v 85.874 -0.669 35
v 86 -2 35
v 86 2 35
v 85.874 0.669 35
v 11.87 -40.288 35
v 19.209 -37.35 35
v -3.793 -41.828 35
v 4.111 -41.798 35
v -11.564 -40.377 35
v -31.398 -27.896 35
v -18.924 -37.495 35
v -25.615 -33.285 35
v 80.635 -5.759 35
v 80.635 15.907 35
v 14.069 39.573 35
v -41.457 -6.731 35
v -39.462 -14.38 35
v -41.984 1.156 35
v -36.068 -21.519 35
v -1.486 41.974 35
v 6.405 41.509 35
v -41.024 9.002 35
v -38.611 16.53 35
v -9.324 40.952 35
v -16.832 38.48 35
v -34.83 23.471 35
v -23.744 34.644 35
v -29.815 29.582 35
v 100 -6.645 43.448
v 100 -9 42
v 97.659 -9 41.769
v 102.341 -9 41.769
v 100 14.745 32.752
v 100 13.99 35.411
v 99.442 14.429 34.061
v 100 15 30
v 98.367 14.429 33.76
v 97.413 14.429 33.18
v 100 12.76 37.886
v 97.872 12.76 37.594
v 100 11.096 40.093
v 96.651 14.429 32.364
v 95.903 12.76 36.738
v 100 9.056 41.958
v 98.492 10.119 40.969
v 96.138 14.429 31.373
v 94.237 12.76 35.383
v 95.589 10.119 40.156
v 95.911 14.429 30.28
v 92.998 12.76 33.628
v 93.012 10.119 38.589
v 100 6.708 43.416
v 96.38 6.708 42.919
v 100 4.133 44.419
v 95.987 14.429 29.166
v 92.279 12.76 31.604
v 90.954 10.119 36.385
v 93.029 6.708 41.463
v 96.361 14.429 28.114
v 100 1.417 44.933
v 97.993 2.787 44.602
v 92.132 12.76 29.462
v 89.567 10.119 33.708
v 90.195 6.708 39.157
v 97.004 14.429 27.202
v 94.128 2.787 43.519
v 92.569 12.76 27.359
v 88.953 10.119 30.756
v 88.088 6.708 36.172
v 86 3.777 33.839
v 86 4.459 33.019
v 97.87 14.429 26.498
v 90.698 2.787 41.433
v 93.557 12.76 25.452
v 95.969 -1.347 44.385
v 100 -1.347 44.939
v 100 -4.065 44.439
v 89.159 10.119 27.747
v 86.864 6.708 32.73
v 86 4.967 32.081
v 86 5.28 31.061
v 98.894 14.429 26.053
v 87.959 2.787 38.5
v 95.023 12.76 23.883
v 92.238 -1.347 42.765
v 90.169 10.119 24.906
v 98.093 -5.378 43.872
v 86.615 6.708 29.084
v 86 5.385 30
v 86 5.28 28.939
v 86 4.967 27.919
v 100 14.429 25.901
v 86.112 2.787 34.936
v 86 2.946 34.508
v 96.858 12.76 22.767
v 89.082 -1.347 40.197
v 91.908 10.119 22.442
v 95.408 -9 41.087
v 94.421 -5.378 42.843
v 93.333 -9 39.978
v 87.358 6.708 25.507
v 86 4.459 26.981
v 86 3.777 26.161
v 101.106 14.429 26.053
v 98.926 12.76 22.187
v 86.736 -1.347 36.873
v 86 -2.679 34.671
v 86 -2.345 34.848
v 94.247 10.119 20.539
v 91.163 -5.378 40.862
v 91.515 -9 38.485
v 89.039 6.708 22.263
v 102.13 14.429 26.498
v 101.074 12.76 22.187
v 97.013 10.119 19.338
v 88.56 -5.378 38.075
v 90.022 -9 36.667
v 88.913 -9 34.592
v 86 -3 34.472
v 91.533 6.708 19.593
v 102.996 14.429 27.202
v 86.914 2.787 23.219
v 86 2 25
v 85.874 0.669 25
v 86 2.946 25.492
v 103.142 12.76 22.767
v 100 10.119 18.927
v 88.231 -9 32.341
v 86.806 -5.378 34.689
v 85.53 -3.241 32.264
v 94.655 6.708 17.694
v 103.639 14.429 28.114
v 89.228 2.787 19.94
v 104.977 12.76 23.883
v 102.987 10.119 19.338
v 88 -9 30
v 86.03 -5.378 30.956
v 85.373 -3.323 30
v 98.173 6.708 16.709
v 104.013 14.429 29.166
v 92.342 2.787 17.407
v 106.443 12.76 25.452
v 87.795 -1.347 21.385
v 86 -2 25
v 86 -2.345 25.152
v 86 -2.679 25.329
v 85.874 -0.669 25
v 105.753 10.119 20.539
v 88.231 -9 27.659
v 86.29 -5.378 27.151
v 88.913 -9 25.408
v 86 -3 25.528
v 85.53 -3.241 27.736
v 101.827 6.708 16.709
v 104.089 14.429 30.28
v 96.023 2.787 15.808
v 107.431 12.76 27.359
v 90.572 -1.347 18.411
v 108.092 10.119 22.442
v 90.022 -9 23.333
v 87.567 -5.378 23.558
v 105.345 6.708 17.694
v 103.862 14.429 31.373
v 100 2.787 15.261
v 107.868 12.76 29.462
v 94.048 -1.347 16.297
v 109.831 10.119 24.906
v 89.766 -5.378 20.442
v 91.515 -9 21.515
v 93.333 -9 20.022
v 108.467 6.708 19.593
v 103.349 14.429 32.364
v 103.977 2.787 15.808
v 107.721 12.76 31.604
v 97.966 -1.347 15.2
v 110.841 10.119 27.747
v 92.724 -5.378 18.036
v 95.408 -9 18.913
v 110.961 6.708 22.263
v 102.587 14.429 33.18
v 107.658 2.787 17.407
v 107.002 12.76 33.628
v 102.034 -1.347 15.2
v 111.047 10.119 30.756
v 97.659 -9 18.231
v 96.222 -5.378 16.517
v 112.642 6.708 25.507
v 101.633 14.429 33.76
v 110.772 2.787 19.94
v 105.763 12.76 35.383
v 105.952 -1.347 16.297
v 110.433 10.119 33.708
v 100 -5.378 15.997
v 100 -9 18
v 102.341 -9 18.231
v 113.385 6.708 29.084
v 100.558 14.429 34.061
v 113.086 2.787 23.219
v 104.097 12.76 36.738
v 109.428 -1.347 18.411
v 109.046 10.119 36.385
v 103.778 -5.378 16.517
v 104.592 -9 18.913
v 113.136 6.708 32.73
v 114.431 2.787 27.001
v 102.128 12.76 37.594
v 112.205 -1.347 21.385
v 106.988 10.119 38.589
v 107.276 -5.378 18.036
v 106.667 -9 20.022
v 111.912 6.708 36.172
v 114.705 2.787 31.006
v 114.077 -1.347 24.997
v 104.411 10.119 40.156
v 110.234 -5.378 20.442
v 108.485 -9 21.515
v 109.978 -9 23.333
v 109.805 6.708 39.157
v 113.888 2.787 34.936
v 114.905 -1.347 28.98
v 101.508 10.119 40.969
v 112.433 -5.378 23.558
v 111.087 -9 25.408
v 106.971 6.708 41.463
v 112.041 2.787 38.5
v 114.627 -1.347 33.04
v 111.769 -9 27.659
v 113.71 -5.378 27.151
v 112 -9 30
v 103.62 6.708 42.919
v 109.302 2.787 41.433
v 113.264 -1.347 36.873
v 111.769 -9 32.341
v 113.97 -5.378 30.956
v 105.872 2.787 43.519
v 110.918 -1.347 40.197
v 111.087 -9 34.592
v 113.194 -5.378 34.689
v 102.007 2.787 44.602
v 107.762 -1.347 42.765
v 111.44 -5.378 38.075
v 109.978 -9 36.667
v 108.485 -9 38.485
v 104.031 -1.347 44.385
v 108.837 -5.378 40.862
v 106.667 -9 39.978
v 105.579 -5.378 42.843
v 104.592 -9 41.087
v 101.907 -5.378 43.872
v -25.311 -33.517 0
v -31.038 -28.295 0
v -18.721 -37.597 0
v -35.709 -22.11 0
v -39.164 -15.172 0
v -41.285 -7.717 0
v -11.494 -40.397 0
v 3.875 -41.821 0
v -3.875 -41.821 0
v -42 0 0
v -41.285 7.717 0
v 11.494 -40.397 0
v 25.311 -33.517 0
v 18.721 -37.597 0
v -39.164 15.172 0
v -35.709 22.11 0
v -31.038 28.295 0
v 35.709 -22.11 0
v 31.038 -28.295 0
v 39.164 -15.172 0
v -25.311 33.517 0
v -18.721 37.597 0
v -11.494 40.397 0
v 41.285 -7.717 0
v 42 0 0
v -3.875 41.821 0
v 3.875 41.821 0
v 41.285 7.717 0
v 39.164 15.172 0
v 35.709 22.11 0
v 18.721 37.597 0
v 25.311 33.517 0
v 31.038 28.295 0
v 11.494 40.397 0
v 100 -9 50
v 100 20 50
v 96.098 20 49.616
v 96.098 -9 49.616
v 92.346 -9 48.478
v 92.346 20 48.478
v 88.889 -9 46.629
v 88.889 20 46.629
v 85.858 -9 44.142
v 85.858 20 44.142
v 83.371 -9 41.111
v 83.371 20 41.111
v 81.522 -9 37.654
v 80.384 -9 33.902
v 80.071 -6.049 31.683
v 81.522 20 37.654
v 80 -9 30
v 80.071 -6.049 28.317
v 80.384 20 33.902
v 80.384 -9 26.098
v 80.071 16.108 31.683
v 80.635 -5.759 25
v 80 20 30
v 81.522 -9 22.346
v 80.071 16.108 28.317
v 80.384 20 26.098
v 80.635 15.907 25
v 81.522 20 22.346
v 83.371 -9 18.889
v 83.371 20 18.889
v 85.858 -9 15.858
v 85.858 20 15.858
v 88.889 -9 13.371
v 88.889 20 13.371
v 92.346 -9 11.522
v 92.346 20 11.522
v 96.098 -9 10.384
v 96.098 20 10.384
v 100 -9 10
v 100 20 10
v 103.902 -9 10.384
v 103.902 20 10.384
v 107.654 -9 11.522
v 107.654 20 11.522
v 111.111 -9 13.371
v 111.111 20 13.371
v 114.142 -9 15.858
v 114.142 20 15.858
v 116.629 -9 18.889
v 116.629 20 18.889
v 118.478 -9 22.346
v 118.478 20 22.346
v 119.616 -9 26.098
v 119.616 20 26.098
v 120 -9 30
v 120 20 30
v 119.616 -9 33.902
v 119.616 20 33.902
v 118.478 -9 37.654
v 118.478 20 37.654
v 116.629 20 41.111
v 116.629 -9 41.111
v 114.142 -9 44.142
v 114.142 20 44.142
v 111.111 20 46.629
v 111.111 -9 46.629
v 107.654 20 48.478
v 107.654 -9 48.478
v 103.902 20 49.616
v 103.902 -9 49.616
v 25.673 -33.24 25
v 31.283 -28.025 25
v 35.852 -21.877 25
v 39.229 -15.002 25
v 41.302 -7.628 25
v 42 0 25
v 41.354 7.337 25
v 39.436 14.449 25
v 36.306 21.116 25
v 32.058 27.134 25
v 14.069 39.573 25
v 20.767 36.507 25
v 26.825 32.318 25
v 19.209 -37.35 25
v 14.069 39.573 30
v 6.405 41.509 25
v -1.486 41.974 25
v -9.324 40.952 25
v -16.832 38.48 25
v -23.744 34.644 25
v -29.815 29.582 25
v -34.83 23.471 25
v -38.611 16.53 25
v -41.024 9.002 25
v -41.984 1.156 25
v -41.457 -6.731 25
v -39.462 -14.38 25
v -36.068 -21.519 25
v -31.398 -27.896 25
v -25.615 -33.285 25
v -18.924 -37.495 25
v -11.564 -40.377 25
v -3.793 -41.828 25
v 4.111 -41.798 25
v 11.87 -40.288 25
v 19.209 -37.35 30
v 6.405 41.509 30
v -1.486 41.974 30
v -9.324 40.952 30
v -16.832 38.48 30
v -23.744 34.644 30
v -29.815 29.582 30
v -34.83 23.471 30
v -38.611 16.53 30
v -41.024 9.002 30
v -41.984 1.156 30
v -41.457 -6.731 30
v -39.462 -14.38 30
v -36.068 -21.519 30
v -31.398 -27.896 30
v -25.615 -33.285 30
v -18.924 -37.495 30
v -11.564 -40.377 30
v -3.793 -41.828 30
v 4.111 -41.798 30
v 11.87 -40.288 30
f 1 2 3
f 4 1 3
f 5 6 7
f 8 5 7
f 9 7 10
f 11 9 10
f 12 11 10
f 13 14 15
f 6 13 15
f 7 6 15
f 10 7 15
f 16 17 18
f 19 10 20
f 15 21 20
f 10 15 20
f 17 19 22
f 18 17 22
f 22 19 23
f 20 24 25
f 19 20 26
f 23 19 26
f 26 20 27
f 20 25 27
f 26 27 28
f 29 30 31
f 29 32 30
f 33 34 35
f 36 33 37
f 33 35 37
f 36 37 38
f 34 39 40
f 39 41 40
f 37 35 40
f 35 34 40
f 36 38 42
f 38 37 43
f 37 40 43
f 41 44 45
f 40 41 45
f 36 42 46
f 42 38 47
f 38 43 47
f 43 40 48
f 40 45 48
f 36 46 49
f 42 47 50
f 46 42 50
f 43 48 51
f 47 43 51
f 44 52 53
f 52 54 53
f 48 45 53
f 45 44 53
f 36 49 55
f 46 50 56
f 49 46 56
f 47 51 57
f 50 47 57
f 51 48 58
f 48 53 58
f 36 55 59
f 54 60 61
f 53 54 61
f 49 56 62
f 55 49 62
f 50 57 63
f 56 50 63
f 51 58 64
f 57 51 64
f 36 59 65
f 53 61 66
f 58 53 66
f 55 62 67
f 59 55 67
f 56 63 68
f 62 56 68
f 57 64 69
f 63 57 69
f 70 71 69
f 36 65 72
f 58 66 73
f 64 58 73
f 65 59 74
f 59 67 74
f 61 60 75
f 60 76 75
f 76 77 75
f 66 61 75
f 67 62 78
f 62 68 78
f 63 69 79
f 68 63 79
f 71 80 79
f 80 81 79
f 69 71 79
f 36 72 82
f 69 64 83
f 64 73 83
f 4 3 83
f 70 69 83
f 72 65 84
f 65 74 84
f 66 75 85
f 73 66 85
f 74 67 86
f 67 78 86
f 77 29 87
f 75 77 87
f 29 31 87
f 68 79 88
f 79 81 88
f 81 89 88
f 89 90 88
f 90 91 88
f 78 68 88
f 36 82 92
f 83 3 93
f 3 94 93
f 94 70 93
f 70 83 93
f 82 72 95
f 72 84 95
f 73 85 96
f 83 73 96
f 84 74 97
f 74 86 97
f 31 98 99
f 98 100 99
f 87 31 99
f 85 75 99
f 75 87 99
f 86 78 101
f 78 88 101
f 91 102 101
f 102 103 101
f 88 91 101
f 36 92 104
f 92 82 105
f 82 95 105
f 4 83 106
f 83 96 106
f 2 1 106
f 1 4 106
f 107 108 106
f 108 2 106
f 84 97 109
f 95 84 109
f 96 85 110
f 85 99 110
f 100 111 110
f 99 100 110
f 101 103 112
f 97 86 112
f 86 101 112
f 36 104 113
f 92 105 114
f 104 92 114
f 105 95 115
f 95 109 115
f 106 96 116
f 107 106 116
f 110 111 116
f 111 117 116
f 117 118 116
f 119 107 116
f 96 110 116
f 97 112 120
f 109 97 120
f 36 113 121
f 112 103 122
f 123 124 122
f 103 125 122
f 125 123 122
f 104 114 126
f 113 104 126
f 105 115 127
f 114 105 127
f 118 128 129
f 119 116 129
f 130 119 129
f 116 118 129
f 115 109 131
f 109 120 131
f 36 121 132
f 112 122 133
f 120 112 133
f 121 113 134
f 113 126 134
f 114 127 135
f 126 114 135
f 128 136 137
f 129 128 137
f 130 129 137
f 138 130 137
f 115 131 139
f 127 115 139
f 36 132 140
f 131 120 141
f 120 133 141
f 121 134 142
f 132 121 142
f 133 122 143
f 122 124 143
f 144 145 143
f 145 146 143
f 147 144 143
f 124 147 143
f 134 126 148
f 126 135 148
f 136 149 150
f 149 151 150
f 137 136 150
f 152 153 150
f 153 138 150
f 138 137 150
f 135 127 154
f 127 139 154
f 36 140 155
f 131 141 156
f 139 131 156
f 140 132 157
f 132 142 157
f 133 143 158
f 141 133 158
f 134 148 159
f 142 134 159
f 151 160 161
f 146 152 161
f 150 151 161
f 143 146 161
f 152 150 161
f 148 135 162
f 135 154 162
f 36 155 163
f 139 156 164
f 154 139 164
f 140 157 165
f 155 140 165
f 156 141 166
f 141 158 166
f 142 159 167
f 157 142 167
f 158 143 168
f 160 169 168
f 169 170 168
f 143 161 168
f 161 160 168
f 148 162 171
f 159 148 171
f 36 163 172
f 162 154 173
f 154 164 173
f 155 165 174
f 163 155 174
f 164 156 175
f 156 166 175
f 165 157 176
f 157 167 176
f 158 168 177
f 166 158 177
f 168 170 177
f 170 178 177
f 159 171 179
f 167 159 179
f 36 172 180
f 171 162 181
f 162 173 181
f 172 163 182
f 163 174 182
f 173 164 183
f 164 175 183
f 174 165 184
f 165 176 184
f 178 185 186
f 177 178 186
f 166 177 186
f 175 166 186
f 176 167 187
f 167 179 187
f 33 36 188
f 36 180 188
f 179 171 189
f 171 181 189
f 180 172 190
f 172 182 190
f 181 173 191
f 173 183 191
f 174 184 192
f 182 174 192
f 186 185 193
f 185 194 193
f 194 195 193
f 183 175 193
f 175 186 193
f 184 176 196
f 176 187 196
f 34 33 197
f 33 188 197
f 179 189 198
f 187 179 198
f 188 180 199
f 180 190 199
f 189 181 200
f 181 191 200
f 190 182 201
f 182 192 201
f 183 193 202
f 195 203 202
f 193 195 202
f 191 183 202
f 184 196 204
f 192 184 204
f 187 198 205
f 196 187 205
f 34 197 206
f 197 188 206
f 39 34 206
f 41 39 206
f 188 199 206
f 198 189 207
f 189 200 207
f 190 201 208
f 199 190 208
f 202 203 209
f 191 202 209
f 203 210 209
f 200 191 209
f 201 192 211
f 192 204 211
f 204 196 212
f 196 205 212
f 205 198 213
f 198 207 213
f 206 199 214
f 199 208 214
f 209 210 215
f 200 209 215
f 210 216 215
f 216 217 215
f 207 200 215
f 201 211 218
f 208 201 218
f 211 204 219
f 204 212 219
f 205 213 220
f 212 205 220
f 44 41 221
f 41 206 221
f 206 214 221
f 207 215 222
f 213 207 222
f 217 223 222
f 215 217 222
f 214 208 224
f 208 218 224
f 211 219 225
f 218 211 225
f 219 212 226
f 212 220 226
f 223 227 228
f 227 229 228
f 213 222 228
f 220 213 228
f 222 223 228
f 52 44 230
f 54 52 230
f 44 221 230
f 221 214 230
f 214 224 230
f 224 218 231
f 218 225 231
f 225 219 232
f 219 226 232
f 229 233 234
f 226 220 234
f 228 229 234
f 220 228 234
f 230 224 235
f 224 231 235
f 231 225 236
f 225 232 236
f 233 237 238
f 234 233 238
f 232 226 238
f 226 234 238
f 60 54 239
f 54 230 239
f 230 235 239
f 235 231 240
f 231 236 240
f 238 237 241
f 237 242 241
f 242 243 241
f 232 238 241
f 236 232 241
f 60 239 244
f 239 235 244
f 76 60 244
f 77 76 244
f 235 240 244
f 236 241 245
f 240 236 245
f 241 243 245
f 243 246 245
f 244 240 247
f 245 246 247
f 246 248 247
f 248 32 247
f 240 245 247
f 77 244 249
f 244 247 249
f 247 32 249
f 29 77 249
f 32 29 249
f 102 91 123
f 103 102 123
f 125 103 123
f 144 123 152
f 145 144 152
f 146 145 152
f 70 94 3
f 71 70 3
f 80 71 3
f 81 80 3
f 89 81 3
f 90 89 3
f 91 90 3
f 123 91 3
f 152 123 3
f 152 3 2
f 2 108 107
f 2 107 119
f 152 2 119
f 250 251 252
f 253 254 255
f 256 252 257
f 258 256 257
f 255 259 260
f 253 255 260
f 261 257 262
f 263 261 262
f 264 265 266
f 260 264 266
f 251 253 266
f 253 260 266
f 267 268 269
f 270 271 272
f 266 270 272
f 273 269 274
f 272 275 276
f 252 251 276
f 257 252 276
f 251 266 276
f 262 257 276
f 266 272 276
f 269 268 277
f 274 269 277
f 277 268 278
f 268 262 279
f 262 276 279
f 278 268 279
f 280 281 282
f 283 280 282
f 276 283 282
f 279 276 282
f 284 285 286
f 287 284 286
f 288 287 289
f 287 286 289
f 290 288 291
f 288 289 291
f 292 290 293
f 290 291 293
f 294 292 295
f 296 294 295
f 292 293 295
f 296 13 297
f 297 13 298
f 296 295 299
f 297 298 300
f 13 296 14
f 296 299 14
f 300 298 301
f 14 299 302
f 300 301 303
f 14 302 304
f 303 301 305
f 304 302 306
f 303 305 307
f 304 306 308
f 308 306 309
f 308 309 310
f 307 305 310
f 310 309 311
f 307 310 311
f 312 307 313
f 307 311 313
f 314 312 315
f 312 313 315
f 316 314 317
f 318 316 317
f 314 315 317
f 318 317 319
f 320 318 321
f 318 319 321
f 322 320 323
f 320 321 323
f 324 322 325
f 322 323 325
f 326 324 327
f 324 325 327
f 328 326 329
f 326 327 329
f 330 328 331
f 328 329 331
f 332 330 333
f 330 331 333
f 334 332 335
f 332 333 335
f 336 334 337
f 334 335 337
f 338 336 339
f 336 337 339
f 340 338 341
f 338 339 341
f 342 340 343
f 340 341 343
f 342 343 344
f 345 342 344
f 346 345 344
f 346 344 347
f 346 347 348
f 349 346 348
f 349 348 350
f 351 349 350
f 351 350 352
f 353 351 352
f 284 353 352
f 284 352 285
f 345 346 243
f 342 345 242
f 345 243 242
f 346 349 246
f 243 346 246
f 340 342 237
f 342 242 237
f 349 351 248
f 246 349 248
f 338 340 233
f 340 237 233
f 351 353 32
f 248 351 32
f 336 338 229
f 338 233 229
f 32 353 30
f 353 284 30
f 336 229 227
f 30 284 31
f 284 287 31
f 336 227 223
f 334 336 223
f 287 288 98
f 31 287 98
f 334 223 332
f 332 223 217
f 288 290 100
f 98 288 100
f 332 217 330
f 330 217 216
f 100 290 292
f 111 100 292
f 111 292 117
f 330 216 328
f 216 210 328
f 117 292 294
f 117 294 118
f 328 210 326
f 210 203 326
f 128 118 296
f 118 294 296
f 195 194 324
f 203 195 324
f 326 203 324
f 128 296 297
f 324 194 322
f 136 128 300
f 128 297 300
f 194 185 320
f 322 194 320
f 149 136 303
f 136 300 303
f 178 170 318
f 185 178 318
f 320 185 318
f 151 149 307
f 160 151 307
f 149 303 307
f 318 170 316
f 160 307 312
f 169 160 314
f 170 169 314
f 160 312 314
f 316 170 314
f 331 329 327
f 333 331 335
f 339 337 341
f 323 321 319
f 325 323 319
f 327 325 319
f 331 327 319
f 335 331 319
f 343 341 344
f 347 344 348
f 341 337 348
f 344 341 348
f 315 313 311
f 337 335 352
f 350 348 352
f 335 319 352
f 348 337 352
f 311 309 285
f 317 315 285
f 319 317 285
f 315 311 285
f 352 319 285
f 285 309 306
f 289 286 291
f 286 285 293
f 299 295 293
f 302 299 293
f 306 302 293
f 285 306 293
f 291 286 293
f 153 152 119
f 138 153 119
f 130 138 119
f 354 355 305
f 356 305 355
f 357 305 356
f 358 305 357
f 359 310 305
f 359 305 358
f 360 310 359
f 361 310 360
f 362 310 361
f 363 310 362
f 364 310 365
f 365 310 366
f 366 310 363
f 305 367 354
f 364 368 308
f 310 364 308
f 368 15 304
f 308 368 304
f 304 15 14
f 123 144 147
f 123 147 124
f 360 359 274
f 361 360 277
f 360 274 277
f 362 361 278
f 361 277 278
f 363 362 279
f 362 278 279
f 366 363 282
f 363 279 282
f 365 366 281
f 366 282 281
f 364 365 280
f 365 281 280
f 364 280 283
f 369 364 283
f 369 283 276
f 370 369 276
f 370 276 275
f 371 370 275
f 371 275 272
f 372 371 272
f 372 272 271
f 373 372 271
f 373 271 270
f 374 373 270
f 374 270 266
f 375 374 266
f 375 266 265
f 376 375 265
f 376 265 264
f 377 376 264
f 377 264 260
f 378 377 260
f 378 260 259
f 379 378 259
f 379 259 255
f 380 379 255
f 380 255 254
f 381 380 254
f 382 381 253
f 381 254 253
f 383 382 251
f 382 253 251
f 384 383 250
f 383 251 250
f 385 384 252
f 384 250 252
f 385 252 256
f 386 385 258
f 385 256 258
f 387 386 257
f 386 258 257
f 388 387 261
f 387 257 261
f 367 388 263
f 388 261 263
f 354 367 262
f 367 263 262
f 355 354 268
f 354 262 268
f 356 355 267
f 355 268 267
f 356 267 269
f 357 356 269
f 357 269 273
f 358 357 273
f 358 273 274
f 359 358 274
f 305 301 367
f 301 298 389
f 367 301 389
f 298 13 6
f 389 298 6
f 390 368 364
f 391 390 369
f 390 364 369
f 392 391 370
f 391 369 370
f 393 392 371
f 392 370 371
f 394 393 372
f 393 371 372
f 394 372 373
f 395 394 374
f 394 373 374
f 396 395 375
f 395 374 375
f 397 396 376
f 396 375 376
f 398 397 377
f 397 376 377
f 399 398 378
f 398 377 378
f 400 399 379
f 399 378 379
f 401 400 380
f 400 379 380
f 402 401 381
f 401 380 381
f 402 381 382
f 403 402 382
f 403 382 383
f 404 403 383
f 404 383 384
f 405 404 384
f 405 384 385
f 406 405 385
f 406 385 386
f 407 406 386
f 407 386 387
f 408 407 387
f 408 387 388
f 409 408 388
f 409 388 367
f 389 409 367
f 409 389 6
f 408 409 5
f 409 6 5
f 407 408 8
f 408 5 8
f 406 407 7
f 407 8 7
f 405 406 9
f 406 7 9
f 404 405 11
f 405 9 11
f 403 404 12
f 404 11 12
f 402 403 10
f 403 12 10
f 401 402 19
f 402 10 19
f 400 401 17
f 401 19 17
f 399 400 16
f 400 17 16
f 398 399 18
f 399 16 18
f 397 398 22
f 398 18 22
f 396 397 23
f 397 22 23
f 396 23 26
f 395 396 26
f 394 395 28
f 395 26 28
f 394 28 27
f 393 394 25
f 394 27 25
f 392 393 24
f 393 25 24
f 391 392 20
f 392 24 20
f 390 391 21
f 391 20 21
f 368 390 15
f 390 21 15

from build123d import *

# Parameters (mm, degrees)
SKETCH_1_R      = 42
EXTRUDE_1_DEPTH = 30
EXTRUDE_2_DEPTH = 5


with BuildPart() as part:
    # 草图1 → 凸台-拉伸1 (new body)
    with BuildSketch(Plane.XY):
        Circle(SKETCH_1_R)
    extrude(amount=EXTRUDE_1_DEPTH)



with BuildPart() as body_2:
    # 草图2 → 旋转1 (revolve)
    with BuildSketch(Plane.XY.offset(30), mode=Mode.PRIVATE) as revolve_1_sk:
        with BuildLine():
            Line((100, 20), (100, 15))
            ThreePointArc((100, 15), (86.583592135, 6.708203932), (88, -9))
            Line((88, -9), (80, -9))
            Line((80, -9), (80, 20))
            Line((80, 20), (100, 20))
        make_face()
    revolve(revolve_1_sk.sketch.rotate(Axis((100, 22.717290725, 30), (0, -1, 0)), 270), axis=Axis((100, 22.717290725, 30), (0, -1, 0)))


with BuildPart() as part_1:
    add(part.part)

    add(body_2.part)  # 凸台-拉伸2 merges body 2
    # 草图3 → 凸台-拉伸2 (add, symmetric)
    with BuildSketch(Plane.XY.offset(30)):
        with BuildLine():
            Line((14.069453744, 39.573355574), (86, 14))
            Line((86, 14), (86, -3))
            Line((86, -3), (19.208719722, -37.350034627))
            ThreePointArc((19.208719722, -37.350034627), (-41.906577017, -2.79978619), (14.069453744, 39.573355574))
        make_face()
    extrude(amount=EXTRUDE_2_DEPTH, both=True)


solid = part_1.part
